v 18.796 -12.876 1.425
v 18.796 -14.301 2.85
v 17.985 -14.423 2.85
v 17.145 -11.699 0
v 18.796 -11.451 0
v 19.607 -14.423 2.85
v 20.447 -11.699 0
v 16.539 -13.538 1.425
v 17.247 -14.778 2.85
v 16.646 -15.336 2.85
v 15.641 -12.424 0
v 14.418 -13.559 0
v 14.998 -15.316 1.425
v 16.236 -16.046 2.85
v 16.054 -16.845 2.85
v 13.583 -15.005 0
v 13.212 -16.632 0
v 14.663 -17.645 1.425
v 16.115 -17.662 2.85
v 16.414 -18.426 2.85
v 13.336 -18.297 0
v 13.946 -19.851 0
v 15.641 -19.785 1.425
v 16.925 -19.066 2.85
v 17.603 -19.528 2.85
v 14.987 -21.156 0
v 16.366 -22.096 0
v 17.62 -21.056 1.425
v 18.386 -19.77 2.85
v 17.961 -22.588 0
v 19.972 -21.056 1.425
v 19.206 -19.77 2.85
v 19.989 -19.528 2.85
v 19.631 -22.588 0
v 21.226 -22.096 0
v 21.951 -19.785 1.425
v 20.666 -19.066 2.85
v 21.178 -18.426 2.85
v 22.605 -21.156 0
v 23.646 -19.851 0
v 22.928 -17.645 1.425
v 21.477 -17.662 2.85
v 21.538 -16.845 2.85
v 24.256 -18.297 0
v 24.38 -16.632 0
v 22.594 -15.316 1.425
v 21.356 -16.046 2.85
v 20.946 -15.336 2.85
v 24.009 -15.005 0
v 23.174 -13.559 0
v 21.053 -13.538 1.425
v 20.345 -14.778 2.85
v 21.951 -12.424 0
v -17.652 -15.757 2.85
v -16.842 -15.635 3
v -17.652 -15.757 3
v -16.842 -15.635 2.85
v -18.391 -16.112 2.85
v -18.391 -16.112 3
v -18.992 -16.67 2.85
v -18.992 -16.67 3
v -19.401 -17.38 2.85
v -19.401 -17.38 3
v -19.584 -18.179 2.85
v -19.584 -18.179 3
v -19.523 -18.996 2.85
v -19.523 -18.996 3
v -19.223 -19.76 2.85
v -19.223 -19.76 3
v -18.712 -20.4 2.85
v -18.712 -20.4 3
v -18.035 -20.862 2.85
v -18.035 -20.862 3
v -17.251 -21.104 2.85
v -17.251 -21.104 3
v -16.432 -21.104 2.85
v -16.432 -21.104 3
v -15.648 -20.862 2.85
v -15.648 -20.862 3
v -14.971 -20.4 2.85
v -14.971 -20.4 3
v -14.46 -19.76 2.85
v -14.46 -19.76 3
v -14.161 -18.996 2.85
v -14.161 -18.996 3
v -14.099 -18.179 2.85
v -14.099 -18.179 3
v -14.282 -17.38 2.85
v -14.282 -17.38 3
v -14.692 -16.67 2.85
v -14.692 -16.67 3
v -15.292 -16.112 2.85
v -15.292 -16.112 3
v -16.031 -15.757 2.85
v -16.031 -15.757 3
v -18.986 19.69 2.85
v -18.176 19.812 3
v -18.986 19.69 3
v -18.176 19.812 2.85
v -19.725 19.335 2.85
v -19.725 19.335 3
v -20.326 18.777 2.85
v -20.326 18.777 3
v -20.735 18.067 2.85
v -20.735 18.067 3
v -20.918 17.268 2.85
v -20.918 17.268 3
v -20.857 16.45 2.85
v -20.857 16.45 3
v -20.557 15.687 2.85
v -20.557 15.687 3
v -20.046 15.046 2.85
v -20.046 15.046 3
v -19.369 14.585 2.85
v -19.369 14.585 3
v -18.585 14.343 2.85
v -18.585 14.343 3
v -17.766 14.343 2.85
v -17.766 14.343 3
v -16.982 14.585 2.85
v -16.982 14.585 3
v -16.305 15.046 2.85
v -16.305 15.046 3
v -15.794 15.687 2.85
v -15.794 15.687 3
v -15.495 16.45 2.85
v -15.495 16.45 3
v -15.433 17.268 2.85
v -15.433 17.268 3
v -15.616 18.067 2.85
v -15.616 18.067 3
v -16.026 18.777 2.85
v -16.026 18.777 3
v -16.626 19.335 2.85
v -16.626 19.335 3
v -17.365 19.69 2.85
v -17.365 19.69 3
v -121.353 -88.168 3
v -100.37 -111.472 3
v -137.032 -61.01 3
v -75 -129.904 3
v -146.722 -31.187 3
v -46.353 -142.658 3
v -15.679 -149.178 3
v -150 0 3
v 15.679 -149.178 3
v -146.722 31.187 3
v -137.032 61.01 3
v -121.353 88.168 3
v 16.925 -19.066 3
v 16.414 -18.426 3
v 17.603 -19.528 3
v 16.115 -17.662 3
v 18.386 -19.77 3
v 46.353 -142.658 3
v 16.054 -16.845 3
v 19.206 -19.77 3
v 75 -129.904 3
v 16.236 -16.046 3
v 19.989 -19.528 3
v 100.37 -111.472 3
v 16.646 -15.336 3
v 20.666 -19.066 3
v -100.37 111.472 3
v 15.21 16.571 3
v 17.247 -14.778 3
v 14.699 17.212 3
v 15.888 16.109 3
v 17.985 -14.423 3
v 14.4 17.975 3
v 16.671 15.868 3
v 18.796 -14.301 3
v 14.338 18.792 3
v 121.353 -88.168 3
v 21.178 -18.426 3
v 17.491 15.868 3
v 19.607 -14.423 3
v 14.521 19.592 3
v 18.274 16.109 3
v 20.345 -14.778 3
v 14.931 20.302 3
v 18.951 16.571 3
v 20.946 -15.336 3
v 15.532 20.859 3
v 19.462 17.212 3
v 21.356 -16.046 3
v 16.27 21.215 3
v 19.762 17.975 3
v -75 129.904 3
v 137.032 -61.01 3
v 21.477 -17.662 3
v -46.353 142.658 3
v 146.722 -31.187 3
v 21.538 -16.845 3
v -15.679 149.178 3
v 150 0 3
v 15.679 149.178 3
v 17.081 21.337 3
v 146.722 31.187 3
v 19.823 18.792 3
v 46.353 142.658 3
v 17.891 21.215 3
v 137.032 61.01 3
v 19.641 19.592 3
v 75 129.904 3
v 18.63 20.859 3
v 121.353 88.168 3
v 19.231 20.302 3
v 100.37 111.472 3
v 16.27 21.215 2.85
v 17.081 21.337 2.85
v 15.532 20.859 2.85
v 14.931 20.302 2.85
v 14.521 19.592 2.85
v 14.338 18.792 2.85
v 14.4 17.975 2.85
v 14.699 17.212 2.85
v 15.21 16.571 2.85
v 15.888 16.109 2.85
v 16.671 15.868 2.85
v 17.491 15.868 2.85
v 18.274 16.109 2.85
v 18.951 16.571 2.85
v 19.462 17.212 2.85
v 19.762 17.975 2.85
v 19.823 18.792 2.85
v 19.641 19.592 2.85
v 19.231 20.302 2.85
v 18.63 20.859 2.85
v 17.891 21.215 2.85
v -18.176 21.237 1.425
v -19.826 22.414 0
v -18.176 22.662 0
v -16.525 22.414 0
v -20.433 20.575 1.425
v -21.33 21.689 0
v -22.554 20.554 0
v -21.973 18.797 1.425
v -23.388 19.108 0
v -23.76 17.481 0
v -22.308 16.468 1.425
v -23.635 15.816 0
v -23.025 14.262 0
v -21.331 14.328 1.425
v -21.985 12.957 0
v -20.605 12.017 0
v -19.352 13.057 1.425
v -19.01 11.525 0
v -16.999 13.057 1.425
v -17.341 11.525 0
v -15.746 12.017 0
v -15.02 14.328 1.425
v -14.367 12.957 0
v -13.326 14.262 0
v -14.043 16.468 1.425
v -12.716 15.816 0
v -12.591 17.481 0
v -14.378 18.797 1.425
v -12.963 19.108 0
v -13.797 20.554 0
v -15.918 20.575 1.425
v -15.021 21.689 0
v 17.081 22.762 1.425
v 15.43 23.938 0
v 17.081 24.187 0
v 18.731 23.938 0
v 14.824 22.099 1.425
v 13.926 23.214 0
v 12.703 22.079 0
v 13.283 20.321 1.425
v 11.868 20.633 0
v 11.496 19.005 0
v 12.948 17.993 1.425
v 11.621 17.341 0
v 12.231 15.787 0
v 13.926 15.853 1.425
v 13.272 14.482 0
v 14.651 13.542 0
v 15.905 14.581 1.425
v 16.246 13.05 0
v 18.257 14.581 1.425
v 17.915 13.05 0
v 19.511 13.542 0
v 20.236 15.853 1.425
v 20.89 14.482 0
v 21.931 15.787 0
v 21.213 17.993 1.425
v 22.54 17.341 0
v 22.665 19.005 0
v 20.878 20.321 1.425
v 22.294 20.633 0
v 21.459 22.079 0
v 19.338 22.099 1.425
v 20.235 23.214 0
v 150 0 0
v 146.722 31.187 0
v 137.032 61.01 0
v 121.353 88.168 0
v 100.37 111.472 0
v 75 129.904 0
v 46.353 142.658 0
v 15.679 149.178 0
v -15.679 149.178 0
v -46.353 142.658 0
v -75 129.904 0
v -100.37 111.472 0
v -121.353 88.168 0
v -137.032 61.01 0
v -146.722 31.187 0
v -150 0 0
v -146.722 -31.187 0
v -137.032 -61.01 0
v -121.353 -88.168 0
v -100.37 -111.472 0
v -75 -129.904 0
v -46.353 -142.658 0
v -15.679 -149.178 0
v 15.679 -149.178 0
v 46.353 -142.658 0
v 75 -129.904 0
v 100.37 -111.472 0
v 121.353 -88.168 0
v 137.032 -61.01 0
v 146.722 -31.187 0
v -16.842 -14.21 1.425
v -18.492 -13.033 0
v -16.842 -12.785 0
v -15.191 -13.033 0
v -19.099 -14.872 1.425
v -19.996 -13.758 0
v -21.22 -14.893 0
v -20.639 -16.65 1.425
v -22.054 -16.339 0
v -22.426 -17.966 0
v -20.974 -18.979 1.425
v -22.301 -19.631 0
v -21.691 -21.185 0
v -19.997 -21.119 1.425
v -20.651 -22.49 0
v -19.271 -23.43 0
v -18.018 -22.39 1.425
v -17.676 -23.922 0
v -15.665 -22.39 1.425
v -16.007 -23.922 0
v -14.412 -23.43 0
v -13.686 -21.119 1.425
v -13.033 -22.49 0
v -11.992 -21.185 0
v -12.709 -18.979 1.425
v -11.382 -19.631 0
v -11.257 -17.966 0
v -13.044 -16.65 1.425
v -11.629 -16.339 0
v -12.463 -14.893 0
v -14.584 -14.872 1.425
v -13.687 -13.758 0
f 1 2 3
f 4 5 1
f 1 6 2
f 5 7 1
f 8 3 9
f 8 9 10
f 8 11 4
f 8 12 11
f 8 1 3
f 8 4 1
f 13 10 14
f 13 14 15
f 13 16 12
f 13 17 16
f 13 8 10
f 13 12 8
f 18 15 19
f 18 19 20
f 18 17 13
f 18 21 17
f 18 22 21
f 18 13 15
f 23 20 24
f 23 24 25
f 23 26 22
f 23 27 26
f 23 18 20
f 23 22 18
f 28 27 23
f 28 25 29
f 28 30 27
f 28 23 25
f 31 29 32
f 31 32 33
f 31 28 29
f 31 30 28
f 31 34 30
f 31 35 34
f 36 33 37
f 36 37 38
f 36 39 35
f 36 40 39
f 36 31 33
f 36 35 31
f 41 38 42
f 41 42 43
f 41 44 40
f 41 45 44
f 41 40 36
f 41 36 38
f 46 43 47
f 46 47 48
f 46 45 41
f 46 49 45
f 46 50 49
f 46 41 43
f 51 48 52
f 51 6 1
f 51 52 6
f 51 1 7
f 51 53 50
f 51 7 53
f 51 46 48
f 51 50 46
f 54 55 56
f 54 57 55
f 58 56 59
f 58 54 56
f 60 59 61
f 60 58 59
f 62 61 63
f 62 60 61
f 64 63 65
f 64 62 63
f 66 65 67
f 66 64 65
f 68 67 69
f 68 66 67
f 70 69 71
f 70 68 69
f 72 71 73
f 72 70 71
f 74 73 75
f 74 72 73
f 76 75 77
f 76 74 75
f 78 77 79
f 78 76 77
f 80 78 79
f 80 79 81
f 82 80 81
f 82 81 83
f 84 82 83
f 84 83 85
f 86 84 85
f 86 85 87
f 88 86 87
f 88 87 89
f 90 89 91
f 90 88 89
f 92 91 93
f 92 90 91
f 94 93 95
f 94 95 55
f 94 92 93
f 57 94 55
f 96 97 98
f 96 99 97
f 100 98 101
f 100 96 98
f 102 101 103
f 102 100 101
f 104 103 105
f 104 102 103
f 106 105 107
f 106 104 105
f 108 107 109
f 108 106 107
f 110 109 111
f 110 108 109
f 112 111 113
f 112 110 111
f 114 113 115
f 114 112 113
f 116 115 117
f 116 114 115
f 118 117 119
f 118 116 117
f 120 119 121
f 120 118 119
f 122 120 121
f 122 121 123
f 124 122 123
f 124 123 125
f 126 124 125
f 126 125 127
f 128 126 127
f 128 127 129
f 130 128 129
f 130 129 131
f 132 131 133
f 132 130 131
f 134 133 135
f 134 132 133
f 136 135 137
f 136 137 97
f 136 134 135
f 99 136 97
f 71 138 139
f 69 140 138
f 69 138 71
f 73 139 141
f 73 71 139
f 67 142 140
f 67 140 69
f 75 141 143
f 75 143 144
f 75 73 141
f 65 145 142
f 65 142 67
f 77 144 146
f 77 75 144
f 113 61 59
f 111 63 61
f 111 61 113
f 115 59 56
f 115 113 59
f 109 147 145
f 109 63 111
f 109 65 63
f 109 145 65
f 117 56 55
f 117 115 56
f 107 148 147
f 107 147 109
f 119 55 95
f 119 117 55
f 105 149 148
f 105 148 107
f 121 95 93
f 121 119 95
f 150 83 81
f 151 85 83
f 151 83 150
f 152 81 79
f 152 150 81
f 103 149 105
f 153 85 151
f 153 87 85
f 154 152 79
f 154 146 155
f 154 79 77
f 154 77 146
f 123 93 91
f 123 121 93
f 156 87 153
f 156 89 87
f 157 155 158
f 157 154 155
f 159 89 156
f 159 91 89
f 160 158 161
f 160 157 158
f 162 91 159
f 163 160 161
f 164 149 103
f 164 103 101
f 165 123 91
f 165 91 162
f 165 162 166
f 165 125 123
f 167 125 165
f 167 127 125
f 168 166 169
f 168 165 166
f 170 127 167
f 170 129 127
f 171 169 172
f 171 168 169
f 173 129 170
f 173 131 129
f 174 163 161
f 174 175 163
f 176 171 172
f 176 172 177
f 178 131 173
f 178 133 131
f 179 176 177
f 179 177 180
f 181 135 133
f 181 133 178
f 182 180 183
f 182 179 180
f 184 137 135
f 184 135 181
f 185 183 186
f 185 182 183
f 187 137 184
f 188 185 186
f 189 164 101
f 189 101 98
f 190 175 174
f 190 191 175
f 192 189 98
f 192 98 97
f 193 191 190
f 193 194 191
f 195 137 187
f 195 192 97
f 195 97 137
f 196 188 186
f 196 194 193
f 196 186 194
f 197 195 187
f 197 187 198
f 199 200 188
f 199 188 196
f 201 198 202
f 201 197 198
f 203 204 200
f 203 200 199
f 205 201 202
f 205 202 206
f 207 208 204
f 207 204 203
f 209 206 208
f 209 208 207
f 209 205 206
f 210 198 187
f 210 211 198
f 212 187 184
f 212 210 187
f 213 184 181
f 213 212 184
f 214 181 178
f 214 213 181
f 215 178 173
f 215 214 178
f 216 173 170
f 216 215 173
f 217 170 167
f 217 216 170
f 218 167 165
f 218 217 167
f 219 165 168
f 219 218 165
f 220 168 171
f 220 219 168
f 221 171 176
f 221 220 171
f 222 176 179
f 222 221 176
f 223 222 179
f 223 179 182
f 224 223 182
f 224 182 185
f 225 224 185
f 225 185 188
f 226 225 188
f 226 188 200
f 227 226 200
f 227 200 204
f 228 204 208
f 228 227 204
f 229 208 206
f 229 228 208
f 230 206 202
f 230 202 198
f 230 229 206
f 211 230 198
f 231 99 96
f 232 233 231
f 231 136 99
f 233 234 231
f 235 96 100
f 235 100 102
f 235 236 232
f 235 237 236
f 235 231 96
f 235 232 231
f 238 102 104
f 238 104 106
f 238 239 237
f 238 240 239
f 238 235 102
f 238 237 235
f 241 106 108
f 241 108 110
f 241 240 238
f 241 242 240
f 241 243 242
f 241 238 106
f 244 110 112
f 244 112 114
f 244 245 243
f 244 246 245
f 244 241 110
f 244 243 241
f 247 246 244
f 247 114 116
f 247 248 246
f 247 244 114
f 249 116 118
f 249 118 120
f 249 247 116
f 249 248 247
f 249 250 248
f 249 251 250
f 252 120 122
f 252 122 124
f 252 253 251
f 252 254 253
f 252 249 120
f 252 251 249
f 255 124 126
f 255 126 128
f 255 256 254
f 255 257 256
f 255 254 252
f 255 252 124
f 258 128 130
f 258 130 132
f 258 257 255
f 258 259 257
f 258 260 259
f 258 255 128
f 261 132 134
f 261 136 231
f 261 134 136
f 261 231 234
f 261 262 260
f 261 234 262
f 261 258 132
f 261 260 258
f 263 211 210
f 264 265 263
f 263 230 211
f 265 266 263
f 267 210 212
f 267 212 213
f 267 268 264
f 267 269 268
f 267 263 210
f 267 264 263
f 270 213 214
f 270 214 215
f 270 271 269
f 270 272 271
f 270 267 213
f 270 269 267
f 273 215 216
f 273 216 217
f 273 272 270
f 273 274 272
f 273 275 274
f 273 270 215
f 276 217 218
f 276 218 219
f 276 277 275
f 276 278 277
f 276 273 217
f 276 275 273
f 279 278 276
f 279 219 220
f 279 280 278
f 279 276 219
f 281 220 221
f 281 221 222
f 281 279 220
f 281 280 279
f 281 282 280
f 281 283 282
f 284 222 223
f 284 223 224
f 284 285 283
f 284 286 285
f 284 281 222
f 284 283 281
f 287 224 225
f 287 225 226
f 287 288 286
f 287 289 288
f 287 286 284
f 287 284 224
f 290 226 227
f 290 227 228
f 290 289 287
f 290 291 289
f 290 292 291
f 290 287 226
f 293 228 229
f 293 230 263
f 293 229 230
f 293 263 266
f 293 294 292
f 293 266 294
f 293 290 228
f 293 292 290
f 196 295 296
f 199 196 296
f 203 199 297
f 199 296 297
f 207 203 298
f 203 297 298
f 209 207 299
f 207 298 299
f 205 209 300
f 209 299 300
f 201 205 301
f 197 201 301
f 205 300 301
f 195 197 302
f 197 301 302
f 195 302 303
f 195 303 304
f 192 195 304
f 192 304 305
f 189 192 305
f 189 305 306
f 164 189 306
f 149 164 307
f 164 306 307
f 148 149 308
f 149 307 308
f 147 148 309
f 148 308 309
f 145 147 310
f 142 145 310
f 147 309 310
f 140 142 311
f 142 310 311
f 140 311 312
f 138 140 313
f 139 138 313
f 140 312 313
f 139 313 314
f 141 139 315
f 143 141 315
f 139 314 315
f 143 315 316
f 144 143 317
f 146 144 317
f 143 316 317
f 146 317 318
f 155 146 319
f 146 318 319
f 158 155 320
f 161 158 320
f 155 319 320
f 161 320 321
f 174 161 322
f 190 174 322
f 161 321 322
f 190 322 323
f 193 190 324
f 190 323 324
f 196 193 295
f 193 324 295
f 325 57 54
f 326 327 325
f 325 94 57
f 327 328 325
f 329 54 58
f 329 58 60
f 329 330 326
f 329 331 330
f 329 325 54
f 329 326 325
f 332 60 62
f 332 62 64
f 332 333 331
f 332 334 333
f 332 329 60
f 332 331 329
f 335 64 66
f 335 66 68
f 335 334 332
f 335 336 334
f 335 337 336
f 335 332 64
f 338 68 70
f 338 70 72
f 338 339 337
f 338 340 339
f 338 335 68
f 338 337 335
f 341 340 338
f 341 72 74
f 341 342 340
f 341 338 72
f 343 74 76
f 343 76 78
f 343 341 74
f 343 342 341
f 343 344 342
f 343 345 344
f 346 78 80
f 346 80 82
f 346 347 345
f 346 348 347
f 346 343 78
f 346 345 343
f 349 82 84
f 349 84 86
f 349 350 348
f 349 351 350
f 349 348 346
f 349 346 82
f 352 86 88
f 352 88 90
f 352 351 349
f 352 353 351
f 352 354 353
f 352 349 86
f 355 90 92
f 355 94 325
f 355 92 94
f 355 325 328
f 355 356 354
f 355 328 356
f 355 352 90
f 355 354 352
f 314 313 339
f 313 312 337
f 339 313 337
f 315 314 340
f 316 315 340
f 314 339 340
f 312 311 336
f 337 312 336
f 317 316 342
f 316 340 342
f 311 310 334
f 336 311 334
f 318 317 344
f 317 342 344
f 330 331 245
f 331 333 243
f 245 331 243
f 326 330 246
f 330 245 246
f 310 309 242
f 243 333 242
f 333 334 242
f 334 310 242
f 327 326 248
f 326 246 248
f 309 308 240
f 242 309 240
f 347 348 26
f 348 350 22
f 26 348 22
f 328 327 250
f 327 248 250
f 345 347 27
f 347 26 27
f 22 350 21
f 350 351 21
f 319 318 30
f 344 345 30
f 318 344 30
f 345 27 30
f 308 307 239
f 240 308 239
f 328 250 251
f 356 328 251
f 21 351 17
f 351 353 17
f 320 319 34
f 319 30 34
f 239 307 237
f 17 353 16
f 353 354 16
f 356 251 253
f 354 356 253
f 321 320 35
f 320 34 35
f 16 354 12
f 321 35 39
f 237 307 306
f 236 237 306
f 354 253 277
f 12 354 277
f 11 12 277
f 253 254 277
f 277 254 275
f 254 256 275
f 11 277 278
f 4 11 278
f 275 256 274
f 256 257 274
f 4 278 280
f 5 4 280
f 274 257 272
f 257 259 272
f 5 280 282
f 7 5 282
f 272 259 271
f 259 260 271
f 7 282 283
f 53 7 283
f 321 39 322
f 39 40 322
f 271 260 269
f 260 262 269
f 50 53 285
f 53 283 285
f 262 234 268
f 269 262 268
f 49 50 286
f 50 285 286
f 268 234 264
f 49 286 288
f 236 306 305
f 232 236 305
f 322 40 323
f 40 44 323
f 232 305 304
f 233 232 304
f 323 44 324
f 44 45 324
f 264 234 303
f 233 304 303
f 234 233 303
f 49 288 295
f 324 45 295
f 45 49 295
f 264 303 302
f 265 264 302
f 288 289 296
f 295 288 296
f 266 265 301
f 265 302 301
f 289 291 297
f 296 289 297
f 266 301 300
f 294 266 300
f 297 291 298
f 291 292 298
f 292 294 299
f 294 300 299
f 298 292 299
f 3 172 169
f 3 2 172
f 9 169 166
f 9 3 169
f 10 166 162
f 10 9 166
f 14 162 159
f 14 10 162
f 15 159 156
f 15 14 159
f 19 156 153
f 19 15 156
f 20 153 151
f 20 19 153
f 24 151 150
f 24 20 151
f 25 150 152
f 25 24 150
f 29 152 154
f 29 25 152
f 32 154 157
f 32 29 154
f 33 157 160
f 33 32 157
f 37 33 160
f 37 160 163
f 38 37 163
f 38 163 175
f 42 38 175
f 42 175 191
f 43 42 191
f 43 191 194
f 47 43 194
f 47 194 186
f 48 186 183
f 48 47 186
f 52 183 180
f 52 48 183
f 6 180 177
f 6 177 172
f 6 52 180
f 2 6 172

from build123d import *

# Parameters (mm, degrees)
SKETCH1_R                    = 150
BOSS_EXTRUDE1_DEPTH          = 3
CSK_FOR_M5_SFHCS1_AT_2_COUNT = 2
CSK_FOR_M5_SFHCS1_AT_2_PITCH = 35.289297711
CSK_FOR_M5_SFHCS1_AT_3_COUNT = 2
CSK_FOR_M5_SFHCS1_AT_3_PITCH = 50.17586669
CSK_FOR_M5_SFHCS1_AT_4_COUNT = 2
CSK_FOR_M5_SFHCS1_AT_4_PITCH = 35.678748885


with BuildPart() as part:
    # Sketch1 → Boss-Extrude1 (new body)
    with BuildSketch(Plane.XY):
        Circle(SKETCH1_R)
    extrude(amount=BOSS_EXTRUDE1_DEPTH)

    # Sketch4 → CSK for M5 SFHCS1 (revolve, cut)
    with BuildSketch(Plane(origin=(17.080766051, 18.586987198, 0), x_dir=(0, 1, 0), z_dir=(1, 0, 0))):
        Polygon((0, 0), (0, 3), (2.75, 3), (2.75, 2.85), (5.6, 0), align=None)
    csk_for_m5_sfhcs1 = revolve(axis=Axis((17.080766051, 18.586987198, -6.35), (0, 0, 1)), mode=Mode.SUBTRACT)

    # CSK for M5 SFHCS1 at 2: CSK for M5 SFHCS1 ×2
    with Locations(*[Vector(-0.99906632, -0.043202868, 0) * (i * CSK_FOR_M5_SFHCS1_AT_2_PITCH) for i in range(1, CSK_FOR_M5_SFHCS1_AT_2_COUNT)]):
        add(csk_for_m5_sfhcs1, mode=Mode.SUBTRACT)

    # CSK for M5 SFHCS1 at 3: CSK for M5 SFHCS1 ×2
    with Locations(*[Vector(-0.676068537, -0.736838743, 0) * (i * CSK_FOR_M5_SFHCS1_AT_3_PITCH) for i in range(1, CSK_FOR_M5_SFHCS1_AT_3_COUNT)]):
        add(csk_for_m5_sfhcs1, mode=Mode.SUBTRACT)

    # CSK for M5 SFHCS1 at 4: CSK for M5 SFHCS1 ×2
    with Locations(*[Vector(0.048072698, -0.998843839, 0) * (i * CSK_FOR_M5_SFHCS1_AT_4_PITCH) for i in range(1, CSK_FOR_M5_SFHCS1_AT_4_COUNT)]):
        add(csk_for_m5_sfhcs1, mode=Mode.SUBTRACT)


solid = part.part
